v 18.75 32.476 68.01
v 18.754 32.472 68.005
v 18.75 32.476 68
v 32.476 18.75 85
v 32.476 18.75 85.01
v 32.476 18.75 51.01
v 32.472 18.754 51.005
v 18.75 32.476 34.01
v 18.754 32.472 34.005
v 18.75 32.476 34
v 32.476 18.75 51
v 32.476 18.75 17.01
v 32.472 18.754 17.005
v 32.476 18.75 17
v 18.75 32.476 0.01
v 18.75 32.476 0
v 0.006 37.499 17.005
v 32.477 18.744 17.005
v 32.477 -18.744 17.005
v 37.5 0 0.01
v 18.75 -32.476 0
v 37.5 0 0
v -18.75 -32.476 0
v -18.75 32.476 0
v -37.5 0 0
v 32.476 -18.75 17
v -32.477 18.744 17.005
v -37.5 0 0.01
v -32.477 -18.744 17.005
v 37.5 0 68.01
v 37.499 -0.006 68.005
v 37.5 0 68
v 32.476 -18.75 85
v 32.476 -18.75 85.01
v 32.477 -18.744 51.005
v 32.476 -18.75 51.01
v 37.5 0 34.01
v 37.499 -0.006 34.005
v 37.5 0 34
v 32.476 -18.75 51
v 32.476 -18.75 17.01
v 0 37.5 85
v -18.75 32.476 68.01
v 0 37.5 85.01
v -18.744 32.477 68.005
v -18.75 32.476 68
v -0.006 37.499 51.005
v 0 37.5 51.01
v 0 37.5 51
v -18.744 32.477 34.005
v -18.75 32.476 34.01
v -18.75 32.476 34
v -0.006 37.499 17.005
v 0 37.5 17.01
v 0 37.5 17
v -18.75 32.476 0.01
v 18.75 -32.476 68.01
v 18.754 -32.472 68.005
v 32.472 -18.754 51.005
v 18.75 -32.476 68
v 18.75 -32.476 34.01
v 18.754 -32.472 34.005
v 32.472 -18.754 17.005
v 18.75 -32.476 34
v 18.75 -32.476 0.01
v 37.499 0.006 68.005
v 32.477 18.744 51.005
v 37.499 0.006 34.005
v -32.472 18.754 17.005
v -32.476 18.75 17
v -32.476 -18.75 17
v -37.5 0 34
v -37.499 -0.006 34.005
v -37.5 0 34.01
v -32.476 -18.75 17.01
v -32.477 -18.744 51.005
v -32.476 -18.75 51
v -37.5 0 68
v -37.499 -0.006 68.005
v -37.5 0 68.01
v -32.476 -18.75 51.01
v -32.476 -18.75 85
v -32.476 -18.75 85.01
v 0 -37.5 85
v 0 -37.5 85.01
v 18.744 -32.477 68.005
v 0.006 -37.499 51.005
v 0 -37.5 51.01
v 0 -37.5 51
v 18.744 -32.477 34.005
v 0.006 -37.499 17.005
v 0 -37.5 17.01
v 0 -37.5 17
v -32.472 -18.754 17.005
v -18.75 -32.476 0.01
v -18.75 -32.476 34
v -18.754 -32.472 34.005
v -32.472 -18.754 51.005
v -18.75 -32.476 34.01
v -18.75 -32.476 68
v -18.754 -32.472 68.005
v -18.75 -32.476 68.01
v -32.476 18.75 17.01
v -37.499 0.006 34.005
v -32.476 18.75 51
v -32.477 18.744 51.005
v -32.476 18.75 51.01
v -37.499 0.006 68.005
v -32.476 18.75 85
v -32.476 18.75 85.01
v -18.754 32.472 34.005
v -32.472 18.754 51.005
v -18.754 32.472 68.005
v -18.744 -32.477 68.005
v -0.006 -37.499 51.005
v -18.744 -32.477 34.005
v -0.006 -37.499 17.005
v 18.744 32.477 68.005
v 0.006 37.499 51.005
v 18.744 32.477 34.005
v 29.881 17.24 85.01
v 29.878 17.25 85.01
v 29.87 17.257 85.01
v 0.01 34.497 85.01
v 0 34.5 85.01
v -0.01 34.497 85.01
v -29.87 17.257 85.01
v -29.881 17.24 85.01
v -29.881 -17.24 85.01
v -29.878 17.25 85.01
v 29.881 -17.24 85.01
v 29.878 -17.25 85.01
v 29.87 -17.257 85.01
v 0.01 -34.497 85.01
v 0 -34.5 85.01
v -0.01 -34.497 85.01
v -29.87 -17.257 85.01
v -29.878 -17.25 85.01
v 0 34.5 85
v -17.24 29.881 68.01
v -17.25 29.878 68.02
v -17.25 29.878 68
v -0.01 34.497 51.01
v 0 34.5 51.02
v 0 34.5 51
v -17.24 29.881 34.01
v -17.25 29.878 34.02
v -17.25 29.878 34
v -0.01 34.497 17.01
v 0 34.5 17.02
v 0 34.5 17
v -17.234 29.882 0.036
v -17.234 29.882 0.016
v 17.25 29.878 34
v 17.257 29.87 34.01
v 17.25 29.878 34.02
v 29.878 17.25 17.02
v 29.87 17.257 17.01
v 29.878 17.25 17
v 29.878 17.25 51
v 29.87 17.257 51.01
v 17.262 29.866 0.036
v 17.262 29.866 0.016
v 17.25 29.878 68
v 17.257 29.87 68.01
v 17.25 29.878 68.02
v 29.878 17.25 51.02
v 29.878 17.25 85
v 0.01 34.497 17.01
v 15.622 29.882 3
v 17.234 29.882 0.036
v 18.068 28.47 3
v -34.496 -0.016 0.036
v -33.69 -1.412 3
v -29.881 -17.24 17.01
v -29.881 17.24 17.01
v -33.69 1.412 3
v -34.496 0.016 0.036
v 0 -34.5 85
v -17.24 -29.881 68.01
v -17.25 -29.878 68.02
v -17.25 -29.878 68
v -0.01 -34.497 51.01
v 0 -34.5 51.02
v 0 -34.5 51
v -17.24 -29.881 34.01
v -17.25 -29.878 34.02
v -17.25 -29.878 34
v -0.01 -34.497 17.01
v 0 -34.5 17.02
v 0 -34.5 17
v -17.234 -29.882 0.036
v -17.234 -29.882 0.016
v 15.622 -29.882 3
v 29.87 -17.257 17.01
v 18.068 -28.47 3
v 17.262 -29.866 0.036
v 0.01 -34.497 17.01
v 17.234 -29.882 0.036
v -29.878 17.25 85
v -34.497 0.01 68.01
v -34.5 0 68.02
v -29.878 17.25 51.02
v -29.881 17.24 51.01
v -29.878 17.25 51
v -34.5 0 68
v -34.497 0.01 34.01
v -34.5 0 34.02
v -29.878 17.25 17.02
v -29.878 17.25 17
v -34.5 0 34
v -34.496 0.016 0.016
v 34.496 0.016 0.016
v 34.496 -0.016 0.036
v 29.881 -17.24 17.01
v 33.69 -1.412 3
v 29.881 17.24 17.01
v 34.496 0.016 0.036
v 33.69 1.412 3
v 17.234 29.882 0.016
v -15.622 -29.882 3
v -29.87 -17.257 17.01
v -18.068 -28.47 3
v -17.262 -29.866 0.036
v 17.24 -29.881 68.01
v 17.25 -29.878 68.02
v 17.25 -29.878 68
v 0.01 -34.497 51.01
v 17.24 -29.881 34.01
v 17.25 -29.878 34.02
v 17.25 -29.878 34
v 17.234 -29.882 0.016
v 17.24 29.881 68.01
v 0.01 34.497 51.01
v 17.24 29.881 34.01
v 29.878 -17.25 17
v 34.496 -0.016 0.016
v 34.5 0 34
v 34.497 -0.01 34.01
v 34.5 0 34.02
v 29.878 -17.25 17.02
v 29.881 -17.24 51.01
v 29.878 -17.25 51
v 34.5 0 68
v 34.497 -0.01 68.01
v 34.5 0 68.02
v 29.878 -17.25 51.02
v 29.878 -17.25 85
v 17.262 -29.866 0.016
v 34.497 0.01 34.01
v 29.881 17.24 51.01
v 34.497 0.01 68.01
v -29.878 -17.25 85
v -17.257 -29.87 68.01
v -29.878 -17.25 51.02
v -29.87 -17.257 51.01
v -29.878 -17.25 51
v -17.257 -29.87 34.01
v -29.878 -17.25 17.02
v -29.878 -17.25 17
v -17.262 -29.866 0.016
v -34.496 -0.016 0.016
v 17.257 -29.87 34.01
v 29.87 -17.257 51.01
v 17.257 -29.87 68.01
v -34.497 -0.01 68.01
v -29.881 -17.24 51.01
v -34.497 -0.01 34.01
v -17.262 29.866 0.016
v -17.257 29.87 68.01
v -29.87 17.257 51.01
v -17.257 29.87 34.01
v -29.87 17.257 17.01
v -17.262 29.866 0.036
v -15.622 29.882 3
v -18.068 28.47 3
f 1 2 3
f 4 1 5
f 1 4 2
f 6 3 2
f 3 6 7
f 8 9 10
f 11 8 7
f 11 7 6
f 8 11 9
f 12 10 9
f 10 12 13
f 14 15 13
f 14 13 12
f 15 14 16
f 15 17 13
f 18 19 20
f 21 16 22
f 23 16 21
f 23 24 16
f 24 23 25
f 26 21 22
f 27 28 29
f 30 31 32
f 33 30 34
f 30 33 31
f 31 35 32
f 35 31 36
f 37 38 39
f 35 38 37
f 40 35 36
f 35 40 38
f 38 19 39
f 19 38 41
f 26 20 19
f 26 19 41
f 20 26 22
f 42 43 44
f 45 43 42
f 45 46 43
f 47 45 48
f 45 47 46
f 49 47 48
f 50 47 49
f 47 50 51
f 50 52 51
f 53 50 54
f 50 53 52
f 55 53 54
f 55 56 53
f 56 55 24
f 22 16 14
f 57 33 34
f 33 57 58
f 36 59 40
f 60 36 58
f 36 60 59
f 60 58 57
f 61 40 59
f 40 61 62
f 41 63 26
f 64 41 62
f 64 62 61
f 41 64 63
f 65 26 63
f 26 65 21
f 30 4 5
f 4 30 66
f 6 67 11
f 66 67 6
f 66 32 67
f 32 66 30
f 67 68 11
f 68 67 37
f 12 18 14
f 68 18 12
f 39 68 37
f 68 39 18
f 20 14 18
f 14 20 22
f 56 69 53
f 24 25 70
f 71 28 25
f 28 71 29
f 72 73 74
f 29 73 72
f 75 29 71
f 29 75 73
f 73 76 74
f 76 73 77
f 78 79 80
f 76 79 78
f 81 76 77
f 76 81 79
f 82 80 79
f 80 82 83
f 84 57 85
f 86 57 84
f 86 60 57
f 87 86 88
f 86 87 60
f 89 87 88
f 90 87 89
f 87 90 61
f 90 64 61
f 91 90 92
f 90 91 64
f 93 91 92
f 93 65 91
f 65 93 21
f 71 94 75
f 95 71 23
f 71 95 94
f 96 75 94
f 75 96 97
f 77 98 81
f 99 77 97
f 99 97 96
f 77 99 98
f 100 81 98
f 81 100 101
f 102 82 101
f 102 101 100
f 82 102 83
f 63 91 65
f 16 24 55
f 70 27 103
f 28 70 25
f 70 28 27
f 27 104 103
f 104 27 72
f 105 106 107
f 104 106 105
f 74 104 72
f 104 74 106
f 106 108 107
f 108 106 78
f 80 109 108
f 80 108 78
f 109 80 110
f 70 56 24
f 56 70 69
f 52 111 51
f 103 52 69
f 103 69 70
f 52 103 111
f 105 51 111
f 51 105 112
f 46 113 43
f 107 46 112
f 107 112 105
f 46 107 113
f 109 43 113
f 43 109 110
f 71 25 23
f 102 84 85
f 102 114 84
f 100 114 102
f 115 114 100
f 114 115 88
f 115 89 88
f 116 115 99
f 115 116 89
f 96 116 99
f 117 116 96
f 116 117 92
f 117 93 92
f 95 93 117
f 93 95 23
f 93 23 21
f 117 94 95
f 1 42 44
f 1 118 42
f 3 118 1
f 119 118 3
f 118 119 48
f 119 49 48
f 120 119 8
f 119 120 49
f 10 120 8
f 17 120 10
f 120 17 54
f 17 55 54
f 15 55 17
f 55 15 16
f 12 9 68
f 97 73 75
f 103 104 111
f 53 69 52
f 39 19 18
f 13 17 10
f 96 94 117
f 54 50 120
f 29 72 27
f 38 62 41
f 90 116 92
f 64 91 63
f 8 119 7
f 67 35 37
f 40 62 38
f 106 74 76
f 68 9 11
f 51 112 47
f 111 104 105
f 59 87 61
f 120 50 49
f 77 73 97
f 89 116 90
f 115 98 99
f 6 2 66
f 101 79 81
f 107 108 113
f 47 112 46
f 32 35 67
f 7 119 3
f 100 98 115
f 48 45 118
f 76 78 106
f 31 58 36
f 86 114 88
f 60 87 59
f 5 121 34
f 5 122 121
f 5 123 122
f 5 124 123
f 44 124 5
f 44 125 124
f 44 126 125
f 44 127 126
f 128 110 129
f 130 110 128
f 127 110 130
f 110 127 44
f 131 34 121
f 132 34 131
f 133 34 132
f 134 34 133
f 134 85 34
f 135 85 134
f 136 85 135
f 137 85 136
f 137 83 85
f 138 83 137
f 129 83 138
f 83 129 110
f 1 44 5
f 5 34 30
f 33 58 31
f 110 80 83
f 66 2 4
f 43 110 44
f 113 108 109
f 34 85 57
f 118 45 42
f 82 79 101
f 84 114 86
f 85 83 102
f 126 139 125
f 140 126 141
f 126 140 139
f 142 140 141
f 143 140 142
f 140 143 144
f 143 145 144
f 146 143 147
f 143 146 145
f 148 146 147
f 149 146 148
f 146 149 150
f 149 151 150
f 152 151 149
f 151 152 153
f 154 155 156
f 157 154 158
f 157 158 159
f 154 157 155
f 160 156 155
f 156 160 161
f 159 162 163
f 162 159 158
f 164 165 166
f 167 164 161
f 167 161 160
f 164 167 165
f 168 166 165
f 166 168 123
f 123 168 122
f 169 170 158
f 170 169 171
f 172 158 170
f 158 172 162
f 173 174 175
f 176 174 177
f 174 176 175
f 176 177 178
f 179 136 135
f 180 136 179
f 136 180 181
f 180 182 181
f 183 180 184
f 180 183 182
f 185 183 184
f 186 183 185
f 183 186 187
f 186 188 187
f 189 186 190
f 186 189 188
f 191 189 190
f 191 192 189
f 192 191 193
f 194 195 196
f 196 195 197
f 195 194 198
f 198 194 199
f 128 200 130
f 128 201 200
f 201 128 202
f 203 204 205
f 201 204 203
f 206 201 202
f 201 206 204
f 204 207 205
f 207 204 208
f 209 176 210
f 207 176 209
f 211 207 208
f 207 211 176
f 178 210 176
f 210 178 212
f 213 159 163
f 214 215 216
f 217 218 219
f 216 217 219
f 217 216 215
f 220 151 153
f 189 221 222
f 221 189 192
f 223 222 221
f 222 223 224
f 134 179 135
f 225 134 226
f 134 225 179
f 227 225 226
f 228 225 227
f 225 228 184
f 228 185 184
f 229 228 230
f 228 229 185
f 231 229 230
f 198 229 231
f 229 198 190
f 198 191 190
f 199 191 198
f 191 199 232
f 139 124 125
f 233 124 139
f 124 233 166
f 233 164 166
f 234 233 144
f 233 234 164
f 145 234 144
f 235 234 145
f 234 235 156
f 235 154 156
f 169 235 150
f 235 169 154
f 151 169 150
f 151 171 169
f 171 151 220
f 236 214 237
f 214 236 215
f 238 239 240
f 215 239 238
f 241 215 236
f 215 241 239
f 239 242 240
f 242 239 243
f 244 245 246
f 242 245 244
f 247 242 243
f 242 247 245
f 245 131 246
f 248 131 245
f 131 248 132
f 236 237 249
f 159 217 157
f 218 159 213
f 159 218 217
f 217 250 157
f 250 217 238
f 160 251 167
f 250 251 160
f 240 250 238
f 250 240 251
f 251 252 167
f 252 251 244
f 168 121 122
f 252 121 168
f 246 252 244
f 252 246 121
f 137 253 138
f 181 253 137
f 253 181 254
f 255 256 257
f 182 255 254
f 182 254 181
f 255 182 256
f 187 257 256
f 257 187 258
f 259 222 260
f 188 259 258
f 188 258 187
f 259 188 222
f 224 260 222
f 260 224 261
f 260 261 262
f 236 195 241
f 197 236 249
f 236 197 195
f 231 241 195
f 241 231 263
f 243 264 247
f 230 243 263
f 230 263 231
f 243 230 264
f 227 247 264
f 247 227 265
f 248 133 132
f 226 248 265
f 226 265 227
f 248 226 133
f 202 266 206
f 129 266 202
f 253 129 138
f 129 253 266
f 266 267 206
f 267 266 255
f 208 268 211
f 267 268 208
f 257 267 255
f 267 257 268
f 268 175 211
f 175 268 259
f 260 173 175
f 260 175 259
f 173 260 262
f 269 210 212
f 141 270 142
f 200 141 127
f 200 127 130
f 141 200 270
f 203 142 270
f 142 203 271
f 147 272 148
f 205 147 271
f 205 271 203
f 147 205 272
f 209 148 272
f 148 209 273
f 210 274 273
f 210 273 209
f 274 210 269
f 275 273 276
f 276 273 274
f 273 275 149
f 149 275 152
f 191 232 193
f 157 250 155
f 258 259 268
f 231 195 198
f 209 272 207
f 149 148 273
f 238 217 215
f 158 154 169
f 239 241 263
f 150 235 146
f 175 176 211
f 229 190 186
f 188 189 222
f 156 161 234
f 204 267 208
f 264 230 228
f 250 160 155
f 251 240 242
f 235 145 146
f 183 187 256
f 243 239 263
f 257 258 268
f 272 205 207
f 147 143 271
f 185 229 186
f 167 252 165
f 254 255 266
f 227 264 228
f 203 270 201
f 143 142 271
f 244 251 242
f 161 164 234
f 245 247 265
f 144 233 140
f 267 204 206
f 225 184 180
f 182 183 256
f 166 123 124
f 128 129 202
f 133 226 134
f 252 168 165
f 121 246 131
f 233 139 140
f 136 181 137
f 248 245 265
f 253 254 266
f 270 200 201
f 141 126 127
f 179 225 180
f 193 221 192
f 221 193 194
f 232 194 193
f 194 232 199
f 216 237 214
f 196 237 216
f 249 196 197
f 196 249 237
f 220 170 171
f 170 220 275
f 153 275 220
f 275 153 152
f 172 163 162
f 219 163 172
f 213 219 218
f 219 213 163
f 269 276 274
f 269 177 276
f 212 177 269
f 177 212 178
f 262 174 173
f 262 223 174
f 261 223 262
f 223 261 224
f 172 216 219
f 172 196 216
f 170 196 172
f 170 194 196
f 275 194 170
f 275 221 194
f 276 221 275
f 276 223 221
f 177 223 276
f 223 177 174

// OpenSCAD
//external diameter
diameter=75;
height=85;
//N of polygon sides
faces=6;
//vertical subdivisions
segments=5;
//walls and base thickness
wall=3;
hollow=true; // [true,false]

module twisted_vase(diameter,height,faces,segments,wall,hollow) {
	
	e=.01;
	
	difference() {
		for(i=[0:segments-1]) 
			hull() {
				translate([0,0,height/segments*i])
					rotate([0,0,180/faces*(i%2)])
						cylinder(d=diameter, h=e, $fn=faces);
				translate([0,0,height/segments*(i+1)])
					rotate([0,0,180/faces*((i+1)%2)])
						cylinder(d=diameter, h=e, $fn=faces);
		}
		if(hollow)
			for(i=[0:segments-1]) 
				hull() {
					translate([0,0,height/segments*i])
						rotate([0,0,180/faces*(i%2)])
							cylinder(d=diameter-wall*2, h=e*2, $fn=faces);
					translate([0,0,height/segments*(i+1)])
						rotate([0,0,180/faces*((i+1)%2)])
							cylinder(d=diameter-wall*2, h=e*2, $fn=faces);
			}	
	}
	if(hollow) cylinder(d=diameter-wall*2+e, h=wall, $fn=faces);

}

twisted_vase(diameter,height,faces,segments,wall,hollow);
